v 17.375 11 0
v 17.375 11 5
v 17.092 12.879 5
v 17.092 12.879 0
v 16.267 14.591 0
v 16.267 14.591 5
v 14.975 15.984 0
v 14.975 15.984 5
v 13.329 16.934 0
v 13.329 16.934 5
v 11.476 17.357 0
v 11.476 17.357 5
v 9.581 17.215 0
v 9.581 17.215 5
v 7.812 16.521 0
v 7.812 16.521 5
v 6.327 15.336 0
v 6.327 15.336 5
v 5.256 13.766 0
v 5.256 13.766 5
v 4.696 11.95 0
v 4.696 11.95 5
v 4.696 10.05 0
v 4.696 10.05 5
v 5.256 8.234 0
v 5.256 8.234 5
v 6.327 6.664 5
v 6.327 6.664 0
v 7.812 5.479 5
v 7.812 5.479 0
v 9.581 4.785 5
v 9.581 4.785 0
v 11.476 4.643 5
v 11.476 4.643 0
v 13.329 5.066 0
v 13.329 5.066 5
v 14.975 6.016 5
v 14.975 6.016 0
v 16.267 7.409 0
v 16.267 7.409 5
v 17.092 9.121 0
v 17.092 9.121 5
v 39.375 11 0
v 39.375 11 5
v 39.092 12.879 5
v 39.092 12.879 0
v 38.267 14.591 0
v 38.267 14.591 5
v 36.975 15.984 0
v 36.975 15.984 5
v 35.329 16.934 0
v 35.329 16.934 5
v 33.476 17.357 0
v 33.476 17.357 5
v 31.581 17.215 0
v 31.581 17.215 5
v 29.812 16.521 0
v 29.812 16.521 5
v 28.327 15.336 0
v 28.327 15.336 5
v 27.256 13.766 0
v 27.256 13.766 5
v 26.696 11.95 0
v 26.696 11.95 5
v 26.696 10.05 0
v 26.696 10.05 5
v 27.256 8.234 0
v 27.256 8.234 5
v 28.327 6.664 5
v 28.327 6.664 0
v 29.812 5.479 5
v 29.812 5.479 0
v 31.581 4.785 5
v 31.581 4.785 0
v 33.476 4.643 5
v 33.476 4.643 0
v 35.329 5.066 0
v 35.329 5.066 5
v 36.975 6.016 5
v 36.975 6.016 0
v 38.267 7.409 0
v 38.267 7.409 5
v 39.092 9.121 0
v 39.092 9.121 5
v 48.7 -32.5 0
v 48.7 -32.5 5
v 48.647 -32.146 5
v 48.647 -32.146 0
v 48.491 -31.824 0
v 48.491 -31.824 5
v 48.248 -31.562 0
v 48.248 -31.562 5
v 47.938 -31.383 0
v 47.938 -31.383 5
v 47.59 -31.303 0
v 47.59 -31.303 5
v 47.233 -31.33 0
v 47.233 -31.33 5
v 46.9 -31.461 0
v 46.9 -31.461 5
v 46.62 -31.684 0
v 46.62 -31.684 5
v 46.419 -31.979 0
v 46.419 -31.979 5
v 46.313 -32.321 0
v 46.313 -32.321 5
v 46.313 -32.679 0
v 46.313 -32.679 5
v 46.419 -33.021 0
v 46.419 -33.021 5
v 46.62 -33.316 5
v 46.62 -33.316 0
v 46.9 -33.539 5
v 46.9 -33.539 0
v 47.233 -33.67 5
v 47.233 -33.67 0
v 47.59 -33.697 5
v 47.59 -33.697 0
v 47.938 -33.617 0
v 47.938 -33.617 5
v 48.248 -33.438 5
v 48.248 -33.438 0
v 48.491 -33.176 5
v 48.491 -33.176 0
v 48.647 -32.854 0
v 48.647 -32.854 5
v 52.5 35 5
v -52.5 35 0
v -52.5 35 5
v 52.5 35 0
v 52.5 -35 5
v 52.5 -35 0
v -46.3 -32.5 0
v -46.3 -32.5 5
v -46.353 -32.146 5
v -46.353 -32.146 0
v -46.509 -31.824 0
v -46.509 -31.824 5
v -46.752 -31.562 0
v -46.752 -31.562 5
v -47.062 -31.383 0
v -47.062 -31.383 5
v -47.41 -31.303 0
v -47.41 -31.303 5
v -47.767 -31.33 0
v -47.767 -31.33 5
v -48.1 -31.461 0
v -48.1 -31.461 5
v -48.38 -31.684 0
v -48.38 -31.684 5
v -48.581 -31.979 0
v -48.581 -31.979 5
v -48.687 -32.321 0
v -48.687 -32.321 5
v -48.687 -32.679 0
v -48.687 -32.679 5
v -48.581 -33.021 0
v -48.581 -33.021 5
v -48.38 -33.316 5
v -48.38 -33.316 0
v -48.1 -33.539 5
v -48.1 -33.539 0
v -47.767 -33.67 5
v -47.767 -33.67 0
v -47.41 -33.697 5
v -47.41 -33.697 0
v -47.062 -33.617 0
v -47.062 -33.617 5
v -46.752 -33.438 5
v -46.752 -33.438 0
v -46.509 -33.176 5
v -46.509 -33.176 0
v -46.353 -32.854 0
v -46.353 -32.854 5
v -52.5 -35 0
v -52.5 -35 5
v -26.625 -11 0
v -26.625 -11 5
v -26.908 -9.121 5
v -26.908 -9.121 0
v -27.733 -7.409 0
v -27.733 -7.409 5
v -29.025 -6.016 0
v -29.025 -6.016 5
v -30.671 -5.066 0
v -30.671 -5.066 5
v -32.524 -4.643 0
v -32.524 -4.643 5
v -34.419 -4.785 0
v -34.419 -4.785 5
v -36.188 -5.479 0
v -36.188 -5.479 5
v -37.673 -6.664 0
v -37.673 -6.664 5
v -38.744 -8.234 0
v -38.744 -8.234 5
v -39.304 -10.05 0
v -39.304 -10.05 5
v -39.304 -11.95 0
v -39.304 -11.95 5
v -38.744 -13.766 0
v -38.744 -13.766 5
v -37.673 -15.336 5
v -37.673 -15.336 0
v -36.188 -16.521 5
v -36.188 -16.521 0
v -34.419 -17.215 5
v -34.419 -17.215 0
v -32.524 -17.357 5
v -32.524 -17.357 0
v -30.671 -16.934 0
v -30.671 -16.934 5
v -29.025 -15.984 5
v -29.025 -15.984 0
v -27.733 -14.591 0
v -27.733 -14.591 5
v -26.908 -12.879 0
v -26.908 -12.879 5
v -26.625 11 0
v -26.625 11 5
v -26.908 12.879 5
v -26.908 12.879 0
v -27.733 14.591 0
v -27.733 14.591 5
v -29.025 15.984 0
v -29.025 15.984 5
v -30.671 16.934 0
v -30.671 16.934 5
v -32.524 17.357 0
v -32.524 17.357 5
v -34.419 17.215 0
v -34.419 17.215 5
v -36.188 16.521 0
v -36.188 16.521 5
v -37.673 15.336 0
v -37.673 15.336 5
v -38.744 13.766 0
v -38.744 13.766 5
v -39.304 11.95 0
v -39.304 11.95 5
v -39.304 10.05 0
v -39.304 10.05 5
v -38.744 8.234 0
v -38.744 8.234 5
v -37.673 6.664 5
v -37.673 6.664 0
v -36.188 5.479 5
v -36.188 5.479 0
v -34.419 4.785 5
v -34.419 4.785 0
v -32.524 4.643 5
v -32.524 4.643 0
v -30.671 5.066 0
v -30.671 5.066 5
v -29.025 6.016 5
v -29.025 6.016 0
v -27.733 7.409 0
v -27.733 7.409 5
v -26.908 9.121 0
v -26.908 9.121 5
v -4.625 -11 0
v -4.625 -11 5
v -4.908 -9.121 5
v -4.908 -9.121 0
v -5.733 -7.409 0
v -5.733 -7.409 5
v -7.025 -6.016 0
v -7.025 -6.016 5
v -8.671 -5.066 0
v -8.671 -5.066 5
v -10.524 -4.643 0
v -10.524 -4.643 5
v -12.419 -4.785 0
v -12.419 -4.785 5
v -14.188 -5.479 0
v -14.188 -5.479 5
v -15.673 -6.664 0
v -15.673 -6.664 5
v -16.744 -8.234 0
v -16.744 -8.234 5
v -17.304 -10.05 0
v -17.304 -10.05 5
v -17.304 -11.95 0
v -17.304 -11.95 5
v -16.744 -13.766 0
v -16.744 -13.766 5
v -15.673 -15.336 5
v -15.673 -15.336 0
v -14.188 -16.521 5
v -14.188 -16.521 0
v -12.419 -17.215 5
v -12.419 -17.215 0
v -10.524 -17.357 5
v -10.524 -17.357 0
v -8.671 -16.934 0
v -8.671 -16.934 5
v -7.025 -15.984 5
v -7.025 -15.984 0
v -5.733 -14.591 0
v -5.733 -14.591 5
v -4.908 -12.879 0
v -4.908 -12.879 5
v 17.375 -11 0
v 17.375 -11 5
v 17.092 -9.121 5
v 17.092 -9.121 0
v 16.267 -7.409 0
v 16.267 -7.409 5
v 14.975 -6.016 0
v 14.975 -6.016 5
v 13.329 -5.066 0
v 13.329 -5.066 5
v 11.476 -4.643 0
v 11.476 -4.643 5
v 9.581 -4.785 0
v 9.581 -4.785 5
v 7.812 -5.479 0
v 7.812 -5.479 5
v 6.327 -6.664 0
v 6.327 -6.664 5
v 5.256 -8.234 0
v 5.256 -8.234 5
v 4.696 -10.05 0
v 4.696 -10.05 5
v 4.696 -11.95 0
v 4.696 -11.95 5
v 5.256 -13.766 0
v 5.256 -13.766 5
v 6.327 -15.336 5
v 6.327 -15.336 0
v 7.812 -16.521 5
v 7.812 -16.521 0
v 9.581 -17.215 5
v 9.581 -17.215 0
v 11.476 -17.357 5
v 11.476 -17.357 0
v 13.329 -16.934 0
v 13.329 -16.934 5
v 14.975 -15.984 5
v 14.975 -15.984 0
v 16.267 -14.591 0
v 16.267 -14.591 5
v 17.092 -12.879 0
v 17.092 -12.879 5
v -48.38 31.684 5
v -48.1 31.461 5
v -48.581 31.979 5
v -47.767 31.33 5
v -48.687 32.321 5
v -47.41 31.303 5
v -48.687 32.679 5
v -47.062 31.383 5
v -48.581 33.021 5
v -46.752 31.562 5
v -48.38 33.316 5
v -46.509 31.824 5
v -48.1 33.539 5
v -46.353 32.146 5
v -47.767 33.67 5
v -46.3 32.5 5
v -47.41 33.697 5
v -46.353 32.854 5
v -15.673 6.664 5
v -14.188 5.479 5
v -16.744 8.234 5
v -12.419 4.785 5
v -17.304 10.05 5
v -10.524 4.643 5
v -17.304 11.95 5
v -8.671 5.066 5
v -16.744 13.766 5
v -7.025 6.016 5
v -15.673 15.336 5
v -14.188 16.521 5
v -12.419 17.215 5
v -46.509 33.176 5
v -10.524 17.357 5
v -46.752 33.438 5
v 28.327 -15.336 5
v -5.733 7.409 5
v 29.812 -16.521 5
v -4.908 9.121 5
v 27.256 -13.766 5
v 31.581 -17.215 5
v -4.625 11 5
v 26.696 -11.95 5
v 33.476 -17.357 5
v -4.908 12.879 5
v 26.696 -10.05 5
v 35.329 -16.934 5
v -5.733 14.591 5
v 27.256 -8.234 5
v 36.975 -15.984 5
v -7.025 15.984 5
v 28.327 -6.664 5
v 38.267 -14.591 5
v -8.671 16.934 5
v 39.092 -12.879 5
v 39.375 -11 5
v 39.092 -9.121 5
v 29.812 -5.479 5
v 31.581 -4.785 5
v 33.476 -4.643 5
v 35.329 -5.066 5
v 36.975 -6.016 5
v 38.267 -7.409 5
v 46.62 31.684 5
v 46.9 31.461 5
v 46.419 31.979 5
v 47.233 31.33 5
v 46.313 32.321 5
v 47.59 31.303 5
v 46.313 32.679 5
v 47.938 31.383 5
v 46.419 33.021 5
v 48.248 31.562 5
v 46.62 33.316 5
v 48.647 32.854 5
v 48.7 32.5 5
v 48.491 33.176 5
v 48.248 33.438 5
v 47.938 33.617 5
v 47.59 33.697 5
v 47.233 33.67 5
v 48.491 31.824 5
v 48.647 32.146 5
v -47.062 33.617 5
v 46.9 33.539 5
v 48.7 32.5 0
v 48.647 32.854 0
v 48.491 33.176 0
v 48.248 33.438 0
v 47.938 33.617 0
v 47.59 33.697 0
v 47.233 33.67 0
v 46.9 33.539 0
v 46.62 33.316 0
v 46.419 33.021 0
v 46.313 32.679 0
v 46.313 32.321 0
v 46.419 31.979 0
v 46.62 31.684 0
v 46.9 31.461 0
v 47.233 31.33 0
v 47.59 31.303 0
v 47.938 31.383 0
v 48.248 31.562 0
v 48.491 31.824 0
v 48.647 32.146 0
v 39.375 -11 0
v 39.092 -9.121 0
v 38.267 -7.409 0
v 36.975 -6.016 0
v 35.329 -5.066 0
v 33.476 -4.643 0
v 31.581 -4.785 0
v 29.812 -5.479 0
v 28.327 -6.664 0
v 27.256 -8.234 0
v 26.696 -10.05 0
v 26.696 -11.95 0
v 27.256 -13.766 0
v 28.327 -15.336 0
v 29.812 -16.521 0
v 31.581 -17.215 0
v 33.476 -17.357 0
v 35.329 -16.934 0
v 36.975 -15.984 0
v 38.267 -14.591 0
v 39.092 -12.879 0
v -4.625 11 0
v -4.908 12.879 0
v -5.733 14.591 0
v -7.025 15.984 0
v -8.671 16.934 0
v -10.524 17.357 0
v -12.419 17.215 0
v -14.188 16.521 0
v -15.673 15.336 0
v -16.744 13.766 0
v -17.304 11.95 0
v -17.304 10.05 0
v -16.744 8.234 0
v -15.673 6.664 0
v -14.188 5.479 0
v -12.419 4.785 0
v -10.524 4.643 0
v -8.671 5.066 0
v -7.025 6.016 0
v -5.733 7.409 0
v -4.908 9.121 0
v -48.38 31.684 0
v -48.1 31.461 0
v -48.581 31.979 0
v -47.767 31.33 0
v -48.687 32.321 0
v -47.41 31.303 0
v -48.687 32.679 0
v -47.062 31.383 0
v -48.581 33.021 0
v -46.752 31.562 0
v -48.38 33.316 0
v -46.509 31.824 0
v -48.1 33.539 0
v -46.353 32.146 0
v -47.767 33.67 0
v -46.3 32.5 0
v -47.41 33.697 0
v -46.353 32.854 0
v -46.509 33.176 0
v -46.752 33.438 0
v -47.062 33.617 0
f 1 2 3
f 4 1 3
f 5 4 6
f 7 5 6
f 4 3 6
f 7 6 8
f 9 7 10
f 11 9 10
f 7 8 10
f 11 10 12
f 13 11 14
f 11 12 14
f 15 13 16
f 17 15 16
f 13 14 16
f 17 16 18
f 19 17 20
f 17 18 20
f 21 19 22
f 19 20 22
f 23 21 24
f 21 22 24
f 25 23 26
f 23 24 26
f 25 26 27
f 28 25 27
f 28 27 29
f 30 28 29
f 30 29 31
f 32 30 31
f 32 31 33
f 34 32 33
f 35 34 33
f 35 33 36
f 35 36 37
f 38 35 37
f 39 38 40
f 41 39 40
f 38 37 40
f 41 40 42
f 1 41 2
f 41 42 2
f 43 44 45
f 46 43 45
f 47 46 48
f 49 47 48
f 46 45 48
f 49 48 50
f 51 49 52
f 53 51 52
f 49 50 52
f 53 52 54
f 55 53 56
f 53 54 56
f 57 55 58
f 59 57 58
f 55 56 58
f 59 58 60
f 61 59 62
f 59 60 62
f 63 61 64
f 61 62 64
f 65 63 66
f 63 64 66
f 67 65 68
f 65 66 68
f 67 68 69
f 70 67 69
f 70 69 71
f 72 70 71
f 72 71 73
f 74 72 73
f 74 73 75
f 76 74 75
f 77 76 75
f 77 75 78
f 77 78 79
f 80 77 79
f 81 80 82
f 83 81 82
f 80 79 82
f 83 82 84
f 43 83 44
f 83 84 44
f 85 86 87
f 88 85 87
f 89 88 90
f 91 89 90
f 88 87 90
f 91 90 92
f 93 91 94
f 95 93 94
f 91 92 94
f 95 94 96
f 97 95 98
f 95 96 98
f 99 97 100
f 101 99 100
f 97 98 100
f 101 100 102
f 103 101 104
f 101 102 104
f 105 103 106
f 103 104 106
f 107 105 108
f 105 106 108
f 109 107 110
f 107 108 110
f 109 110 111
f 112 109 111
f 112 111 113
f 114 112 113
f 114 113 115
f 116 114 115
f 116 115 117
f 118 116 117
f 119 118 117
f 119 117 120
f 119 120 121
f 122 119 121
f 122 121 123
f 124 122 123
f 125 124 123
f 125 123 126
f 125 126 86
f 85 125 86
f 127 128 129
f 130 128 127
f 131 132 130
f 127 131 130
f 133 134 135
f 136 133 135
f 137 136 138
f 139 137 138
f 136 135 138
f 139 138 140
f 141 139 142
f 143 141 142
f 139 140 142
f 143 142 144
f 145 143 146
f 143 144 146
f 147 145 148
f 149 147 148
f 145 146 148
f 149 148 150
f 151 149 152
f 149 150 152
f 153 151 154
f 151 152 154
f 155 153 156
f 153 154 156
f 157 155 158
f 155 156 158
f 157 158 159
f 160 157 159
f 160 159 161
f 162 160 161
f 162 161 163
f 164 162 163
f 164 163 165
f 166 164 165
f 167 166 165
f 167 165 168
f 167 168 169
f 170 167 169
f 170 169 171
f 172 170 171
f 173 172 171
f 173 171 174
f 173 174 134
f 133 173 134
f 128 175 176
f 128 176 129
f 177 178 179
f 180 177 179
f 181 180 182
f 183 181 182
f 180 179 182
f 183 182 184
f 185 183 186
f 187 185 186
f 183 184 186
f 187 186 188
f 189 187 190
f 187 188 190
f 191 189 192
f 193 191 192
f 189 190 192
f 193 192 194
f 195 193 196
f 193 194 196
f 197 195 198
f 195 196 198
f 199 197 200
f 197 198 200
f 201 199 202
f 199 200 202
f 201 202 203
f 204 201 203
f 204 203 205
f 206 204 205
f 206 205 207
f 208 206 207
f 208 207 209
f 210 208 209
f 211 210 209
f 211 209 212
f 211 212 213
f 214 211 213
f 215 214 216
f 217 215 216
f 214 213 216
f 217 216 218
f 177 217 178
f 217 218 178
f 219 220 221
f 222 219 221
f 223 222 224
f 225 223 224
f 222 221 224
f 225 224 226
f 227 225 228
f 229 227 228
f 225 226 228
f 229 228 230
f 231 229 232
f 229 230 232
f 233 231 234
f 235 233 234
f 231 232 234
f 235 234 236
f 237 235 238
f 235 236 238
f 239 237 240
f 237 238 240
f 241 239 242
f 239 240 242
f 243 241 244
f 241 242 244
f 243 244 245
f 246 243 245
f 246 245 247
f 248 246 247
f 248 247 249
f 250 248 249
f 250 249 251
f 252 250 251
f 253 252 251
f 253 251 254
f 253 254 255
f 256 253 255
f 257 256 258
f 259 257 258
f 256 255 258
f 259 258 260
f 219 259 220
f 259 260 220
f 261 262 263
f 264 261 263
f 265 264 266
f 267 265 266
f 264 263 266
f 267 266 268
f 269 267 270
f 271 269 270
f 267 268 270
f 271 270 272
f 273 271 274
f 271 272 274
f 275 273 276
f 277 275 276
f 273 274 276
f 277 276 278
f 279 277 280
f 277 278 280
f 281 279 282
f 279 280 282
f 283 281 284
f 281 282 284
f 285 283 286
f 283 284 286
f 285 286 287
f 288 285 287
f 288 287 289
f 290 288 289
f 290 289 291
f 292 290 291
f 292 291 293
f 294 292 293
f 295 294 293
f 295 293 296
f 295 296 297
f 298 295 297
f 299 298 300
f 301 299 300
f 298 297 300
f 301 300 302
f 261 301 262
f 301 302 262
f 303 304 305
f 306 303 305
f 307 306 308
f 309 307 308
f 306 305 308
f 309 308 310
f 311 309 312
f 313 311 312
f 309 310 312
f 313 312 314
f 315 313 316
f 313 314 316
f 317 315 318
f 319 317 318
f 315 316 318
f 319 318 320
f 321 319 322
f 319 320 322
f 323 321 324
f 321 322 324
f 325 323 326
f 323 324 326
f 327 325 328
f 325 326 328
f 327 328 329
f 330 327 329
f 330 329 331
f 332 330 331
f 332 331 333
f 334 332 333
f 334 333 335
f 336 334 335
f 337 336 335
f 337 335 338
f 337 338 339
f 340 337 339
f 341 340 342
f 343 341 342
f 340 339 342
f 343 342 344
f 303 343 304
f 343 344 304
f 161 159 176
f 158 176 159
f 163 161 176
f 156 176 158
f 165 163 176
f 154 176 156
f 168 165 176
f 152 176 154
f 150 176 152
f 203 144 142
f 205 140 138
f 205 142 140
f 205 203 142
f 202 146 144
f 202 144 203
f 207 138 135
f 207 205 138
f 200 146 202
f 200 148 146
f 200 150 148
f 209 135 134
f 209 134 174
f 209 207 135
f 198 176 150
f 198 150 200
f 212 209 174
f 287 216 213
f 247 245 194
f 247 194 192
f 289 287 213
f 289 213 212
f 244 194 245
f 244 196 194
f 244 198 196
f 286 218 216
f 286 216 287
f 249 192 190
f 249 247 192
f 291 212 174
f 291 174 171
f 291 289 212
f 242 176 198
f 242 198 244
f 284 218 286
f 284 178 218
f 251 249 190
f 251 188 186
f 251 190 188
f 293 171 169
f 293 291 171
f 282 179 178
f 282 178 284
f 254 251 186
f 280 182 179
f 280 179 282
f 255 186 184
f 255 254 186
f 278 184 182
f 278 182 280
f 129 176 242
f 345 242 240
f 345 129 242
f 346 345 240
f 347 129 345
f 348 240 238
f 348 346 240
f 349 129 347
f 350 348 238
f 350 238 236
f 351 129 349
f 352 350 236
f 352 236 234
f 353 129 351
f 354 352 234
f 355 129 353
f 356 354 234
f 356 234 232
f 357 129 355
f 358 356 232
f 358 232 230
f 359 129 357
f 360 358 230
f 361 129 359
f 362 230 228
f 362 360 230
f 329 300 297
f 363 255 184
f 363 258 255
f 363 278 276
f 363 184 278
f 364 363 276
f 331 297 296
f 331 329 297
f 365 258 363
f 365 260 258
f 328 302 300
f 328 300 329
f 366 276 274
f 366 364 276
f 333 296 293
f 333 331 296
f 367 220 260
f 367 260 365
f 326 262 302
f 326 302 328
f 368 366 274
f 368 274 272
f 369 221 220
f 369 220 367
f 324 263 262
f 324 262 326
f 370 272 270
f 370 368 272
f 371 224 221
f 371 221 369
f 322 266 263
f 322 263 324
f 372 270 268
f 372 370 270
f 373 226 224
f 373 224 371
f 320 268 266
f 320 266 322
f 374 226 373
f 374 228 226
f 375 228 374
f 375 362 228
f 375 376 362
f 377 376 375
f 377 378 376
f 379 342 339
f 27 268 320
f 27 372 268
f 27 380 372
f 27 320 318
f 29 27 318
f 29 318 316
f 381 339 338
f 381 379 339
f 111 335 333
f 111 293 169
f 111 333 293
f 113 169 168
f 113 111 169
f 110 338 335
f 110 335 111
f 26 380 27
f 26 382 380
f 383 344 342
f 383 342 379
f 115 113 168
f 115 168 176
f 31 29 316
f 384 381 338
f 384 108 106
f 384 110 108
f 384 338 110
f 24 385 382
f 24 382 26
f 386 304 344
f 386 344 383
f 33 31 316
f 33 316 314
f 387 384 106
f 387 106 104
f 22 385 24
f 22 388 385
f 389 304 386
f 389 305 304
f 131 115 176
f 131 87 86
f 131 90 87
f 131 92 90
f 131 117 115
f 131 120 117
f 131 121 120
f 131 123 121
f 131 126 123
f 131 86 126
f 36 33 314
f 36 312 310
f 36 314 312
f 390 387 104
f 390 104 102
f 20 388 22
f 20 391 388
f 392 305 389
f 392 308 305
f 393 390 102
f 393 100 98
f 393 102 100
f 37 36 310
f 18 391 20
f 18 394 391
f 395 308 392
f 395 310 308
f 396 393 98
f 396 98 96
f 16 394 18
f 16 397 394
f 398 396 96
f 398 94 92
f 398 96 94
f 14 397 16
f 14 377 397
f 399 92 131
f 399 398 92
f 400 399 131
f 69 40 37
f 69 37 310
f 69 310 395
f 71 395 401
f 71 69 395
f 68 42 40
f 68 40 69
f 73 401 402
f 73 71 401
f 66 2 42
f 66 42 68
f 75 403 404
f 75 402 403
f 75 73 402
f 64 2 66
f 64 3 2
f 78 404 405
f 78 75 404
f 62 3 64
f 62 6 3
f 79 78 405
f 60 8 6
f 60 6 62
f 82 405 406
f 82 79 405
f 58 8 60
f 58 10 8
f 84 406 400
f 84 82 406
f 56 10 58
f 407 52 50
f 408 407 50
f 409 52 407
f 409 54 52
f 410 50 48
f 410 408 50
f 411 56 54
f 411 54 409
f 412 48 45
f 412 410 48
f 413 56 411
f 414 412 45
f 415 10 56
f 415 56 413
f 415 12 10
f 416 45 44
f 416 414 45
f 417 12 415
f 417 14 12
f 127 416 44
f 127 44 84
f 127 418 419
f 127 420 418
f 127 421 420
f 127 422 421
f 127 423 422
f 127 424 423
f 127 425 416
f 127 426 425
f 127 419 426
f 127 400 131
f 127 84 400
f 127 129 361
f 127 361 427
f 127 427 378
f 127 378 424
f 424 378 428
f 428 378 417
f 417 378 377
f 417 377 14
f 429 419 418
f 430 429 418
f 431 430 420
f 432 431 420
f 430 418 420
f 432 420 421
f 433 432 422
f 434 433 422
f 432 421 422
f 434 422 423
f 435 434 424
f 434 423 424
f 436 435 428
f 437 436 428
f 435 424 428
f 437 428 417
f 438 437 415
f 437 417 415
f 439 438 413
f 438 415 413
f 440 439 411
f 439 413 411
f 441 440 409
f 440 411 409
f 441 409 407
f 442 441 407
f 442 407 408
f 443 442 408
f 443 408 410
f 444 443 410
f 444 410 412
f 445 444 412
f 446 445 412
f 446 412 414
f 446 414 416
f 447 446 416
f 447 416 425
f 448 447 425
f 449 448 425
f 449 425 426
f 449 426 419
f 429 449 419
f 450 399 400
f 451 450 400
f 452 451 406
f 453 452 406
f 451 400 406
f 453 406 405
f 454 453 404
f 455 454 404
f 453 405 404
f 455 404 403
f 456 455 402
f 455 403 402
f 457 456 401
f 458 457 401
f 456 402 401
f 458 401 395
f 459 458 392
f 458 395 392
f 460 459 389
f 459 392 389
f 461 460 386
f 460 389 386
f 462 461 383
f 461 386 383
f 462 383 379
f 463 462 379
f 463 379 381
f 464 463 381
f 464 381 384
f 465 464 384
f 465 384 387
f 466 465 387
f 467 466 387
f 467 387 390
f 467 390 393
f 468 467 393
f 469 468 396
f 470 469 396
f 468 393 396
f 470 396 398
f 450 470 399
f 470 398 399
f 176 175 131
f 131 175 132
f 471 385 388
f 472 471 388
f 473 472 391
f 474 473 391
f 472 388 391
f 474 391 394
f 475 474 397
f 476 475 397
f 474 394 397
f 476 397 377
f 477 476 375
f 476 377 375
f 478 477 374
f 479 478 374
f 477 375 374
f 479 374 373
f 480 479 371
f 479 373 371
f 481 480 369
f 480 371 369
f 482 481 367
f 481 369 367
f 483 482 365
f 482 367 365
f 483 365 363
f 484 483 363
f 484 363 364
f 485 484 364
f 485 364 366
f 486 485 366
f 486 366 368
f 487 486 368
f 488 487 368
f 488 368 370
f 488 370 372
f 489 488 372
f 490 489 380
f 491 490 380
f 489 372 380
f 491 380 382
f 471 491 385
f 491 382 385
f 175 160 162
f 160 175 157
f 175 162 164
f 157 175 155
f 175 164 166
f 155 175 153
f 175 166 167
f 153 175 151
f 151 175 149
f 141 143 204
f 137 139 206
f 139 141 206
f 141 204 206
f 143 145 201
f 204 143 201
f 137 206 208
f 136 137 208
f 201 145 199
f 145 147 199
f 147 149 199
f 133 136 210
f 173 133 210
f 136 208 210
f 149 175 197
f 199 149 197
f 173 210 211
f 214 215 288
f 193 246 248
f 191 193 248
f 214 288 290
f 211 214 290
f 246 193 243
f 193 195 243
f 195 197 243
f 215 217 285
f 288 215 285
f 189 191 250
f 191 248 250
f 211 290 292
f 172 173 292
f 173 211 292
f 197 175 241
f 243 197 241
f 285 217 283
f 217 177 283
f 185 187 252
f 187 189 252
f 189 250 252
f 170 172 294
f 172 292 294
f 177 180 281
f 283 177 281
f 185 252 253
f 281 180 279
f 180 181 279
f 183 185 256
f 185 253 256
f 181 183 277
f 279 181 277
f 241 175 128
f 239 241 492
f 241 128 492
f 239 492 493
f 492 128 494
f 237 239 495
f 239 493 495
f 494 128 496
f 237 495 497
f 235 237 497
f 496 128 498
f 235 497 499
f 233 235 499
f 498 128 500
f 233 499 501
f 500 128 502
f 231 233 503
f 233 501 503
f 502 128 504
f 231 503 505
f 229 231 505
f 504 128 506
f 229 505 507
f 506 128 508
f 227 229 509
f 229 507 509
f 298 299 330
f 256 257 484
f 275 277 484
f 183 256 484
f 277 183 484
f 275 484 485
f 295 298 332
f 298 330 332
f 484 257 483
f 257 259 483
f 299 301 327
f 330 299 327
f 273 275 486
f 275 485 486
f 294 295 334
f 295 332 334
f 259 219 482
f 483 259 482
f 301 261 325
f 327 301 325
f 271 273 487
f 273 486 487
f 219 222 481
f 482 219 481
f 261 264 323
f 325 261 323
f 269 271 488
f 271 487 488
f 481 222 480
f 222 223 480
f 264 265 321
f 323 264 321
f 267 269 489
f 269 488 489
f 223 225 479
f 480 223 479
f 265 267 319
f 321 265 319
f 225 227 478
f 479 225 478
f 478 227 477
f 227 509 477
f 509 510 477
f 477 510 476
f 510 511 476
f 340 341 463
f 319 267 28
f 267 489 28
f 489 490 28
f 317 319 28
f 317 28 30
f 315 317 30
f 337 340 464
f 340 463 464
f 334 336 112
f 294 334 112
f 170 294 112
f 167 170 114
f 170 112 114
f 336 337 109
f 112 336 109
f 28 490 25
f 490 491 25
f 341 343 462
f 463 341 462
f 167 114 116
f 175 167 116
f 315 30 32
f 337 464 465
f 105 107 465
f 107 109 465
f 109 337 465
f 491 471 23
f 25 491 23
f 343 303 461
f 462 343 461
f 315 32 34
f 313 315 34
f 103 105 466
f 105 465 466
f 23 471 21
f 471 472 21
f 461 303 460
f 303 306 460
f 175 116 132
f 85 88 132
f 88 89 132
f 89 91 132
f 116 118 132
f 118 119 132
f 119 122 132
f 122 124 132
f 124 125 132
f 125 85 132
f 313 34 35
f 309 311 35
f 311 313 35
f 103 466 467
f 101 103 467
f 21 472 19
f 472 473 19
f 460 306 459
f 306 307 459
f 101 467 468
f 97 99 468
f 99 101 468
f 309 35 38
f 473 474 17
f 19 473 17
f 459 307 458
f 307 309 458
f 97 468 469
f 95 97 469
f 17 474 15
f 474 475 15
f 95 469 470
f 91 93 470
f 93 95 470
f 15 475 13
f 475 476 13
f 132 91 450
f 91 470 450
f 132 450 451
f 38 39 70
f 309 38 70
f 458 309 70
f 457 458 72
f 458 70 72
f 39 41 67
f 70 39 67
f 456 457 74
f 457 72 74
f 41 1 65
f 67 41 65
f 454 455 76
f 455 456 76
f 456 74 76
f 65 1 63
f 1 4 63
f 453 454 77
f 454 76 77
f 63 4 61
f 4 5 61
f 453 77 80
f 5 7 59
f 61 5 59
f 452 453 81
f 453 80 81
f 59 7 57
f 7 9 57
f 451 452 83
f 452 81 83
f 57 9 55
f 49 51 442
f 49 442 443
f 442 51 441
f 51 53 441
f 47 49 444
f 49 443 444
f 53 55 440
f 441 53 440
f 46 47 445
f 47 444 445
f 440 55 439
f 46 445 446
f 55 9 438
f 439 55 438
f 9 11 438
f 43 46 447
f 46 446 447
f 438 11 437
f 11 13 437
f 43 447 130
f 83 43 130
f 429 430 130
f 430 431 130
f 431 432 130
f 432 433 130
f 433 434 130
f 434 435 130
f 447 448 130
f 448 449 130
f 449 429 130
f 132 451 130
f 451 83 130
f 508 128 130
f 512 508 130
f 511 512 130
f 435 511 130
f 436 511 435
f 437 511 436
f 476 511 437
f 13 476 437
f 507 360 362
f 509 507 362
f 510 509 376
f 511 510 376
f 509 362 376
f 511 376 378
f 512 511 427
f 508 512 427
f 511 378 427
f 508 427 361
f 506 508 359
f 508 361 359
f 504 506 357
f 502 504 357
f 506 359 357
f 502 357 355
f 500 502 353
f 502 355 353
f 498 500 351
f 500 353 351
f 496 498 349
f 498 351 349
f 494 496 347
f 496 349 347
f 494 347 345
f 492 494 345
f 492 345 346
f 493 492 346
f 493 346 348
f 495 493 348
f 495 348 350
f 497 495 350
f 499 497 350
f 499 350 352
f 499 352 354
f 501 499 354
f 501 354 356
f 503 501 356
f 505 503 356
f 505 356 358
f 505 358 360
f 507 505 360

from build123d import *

# Parameters (mm, degrees)
SKETCH_W     = 105
SKETCH_H     = 70
PAD_DEPTH    = 5
SKETCH001_R  = 6.375
POCKET_DEPTH = 5
SKETCH002_R  = 1.2
HOLE_DEPTH   = 25


with BuildPart() as part:
    # Sketch → Pad (new body)
    with BuildSketch(Plane.XY):
        Rectangle(SKETCH_W, SKETCH_H)
    extrude(amount=PAD_DEPTH)

    # Sketch001 (on Face6 of Pad) → Pocket (cut)
    with BuildSketch(Plane.XY.offset(5)):
        with Locations((-33, 11)):
            Circle(SKETCH001_R)
        with Locations((33, 11)):
            Circle(SKETCH001_R)
        with Locations((33, -11)):
            Circle(SKETCH001_R)
        with Locations((-33, -11)):
            Circle(SKETCH001_R)
        with Locations((-11, 11)):
            Circle(SKETCH001_R)
        with Locations((11, 11)):
            Circle(SKETCH001_R)
        with Locations((-11, -11)):
            Circle(SKETCH001_R)
        with Locations((11, -11)):
            Circle(SKETCH001_R)
    extrude(amount=-POCKET_DEPTH, mode=Mode.SUBTRACT)

    # Sketch002 (on Face5 of Pocket) → Hole (cut)
    with BuildSketch(Plane.XY.offset(5)):
        with Locations((-47.5, 32.5)):
            Circle(SKETCH002_R)
        with Locations((47.5, 32.5)):
            Circle(SKETCH002_R)
        with Locations((-47.5, -32.5)):
            Circle(SKETCH002_R)
        with Locations((47.5, -32.5)):
            Circle(SKETCH002_R)
    extrude(amount=-HOLE_DEPTH, mode=Mode.SUBTRACT)


solid = part.part
